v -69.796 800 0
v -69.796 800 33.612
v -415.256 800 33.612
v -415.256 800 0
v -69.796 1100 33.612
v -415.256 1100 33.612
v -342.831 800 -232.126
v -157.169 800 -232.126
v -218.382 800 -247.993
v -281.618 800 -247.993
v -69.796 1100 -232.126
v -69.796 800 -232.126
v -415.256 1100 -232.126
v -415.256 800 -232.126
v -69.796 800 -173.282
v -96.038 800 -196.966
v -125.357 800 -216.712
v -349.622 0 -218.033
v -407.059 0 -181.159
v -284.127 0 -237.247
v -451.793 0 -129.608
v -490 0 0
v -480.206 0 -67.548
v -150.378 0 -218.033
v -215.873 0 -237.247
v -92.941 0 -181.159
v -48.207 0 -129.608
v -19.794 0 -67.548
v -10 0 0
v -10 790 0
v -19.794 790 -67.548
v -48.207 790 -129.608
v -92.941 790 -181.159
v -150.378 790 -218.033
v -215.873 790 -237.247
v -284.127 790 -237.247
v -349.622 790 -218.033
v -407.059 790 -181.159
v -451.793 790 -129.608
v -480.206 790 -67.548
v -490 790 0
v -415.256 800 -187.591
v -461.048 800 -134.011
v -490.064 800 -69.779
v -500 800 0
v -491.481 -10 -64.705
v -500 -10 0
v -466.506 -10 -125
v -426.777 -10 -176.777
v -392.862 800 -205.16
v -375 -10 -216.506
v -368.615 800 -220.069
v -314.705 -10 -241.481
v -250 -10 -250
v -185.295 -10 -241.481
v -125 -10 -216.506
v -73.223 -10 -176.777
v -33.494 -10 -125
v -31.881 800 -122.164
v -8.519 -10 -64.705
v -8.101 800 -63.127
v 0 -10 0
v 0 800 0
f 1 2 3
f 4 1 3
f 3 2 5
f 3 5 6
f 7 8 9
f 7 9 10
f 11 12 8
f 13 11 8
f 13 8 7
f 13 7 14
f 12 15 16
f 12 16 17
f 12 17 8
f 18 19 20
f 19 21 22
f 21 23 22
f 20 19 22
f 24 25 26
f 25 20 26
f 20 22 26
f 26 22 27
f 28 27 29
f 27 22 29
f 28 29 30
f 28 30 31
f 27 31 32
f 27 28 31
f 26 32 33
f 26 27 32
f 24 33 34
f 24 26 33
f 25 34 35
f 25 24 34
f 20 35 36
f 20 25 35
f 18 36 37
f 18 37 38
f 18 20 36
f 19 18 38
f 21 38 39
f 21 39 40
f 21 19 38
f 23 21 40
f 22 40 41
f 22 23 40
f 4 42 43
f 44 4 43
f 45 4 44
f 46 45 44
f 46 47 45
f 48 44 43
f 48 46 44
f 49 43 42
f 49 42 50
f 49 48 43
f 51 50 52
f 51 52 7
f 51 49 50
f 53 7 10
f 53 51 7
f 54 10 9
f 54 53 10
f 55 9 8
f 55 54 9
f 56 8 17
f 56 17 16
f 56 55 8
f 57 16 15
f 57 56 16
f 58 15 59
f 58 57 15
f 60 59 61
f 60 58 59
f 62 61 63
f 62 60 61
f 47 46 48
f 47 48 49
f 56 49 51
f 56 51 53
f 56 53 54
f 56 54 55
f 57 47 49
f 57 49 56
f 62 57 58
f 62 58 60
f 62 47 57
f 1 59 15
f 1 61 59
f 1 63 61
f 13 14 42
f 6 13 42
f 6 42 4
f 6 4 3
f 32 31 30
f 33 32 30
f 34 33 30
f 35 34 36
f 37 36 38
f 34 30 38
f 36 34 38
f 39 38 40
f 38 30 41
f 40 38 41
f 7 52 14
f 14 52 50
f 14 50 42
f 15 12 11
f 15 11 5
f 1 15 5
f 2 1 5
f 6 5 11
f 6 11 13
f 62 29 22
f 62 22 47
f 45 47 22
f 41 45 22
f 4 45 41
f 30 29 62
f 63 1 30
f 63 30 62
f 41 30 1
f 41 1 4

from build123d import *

# Parameters (mm, degrees)
F1_DEPTH = 10
F2_DEPTH = 800
F4_DEPTH = 10
F5_W     = 345.459491
F5_H     = 265.73801
F6_DEPTH = 300


with BuildPart() as f1:
    # F0 (on Front) → F1 (new body)
    with BuildSketch(Plane.XZ):
        with BuildLine():
            ThreePointArc((-500, 0), (-250, -250), (0, 0))
            Line((0, 0), (-10, 0))
            ThreePointArc((-10, 0), (-250, -239.685813), (-490, 0))
            Line((-490, 0), (-500, 0))
        make_face()
        with BuildLine():
            ThreePointArc((-490, 0), (-250, -239.685813), (-10, 0))
            Line((-10, 0), (-490, 0))
        make_face()
    extrude(amount=F1_DEPTH)

    # F0 (on Front) → F2 (join)
    with BuildSketch(Plane.XZ):
        with BuildLine():
            ThreePointArc((-500, 0), (-250, -250), (0, 0))
            Line((0, 0), (-10, 0))
            ThreePointArc((-10, 0), (-250, -239.685813), (-490, 0))
            Line((-490, 0), (-500, 0))
        make_face()
    extrude(amount=-F2_DEPTH)

    # F3 (on face) → F4 (join)
    with BuildSketch(Plane(origin=(0, 800, 0), x_dir=(-1, 0, 0), z_dir=(0, 1, 0))):
        with BuildLine():
            Line((490, 0), (10, 0))
            ThreePointArc((10, 0), (250, -239.685813), (490, 0))
        make_face()
    extrude(amount=-F4_DEPTH)

    # F5 (on face) → F6 (join)
    with BuildSketch(Plane(origin=(0, 800, 0), x_dir=(-1, 0, 0), z_dir=(0, 1, 0))):
        with Locations((242.526159, -99.256635)):
            Rectangle(F5_W, F5_H)
    extrude(amount=F6_DEPTH)


solid = f1.part
